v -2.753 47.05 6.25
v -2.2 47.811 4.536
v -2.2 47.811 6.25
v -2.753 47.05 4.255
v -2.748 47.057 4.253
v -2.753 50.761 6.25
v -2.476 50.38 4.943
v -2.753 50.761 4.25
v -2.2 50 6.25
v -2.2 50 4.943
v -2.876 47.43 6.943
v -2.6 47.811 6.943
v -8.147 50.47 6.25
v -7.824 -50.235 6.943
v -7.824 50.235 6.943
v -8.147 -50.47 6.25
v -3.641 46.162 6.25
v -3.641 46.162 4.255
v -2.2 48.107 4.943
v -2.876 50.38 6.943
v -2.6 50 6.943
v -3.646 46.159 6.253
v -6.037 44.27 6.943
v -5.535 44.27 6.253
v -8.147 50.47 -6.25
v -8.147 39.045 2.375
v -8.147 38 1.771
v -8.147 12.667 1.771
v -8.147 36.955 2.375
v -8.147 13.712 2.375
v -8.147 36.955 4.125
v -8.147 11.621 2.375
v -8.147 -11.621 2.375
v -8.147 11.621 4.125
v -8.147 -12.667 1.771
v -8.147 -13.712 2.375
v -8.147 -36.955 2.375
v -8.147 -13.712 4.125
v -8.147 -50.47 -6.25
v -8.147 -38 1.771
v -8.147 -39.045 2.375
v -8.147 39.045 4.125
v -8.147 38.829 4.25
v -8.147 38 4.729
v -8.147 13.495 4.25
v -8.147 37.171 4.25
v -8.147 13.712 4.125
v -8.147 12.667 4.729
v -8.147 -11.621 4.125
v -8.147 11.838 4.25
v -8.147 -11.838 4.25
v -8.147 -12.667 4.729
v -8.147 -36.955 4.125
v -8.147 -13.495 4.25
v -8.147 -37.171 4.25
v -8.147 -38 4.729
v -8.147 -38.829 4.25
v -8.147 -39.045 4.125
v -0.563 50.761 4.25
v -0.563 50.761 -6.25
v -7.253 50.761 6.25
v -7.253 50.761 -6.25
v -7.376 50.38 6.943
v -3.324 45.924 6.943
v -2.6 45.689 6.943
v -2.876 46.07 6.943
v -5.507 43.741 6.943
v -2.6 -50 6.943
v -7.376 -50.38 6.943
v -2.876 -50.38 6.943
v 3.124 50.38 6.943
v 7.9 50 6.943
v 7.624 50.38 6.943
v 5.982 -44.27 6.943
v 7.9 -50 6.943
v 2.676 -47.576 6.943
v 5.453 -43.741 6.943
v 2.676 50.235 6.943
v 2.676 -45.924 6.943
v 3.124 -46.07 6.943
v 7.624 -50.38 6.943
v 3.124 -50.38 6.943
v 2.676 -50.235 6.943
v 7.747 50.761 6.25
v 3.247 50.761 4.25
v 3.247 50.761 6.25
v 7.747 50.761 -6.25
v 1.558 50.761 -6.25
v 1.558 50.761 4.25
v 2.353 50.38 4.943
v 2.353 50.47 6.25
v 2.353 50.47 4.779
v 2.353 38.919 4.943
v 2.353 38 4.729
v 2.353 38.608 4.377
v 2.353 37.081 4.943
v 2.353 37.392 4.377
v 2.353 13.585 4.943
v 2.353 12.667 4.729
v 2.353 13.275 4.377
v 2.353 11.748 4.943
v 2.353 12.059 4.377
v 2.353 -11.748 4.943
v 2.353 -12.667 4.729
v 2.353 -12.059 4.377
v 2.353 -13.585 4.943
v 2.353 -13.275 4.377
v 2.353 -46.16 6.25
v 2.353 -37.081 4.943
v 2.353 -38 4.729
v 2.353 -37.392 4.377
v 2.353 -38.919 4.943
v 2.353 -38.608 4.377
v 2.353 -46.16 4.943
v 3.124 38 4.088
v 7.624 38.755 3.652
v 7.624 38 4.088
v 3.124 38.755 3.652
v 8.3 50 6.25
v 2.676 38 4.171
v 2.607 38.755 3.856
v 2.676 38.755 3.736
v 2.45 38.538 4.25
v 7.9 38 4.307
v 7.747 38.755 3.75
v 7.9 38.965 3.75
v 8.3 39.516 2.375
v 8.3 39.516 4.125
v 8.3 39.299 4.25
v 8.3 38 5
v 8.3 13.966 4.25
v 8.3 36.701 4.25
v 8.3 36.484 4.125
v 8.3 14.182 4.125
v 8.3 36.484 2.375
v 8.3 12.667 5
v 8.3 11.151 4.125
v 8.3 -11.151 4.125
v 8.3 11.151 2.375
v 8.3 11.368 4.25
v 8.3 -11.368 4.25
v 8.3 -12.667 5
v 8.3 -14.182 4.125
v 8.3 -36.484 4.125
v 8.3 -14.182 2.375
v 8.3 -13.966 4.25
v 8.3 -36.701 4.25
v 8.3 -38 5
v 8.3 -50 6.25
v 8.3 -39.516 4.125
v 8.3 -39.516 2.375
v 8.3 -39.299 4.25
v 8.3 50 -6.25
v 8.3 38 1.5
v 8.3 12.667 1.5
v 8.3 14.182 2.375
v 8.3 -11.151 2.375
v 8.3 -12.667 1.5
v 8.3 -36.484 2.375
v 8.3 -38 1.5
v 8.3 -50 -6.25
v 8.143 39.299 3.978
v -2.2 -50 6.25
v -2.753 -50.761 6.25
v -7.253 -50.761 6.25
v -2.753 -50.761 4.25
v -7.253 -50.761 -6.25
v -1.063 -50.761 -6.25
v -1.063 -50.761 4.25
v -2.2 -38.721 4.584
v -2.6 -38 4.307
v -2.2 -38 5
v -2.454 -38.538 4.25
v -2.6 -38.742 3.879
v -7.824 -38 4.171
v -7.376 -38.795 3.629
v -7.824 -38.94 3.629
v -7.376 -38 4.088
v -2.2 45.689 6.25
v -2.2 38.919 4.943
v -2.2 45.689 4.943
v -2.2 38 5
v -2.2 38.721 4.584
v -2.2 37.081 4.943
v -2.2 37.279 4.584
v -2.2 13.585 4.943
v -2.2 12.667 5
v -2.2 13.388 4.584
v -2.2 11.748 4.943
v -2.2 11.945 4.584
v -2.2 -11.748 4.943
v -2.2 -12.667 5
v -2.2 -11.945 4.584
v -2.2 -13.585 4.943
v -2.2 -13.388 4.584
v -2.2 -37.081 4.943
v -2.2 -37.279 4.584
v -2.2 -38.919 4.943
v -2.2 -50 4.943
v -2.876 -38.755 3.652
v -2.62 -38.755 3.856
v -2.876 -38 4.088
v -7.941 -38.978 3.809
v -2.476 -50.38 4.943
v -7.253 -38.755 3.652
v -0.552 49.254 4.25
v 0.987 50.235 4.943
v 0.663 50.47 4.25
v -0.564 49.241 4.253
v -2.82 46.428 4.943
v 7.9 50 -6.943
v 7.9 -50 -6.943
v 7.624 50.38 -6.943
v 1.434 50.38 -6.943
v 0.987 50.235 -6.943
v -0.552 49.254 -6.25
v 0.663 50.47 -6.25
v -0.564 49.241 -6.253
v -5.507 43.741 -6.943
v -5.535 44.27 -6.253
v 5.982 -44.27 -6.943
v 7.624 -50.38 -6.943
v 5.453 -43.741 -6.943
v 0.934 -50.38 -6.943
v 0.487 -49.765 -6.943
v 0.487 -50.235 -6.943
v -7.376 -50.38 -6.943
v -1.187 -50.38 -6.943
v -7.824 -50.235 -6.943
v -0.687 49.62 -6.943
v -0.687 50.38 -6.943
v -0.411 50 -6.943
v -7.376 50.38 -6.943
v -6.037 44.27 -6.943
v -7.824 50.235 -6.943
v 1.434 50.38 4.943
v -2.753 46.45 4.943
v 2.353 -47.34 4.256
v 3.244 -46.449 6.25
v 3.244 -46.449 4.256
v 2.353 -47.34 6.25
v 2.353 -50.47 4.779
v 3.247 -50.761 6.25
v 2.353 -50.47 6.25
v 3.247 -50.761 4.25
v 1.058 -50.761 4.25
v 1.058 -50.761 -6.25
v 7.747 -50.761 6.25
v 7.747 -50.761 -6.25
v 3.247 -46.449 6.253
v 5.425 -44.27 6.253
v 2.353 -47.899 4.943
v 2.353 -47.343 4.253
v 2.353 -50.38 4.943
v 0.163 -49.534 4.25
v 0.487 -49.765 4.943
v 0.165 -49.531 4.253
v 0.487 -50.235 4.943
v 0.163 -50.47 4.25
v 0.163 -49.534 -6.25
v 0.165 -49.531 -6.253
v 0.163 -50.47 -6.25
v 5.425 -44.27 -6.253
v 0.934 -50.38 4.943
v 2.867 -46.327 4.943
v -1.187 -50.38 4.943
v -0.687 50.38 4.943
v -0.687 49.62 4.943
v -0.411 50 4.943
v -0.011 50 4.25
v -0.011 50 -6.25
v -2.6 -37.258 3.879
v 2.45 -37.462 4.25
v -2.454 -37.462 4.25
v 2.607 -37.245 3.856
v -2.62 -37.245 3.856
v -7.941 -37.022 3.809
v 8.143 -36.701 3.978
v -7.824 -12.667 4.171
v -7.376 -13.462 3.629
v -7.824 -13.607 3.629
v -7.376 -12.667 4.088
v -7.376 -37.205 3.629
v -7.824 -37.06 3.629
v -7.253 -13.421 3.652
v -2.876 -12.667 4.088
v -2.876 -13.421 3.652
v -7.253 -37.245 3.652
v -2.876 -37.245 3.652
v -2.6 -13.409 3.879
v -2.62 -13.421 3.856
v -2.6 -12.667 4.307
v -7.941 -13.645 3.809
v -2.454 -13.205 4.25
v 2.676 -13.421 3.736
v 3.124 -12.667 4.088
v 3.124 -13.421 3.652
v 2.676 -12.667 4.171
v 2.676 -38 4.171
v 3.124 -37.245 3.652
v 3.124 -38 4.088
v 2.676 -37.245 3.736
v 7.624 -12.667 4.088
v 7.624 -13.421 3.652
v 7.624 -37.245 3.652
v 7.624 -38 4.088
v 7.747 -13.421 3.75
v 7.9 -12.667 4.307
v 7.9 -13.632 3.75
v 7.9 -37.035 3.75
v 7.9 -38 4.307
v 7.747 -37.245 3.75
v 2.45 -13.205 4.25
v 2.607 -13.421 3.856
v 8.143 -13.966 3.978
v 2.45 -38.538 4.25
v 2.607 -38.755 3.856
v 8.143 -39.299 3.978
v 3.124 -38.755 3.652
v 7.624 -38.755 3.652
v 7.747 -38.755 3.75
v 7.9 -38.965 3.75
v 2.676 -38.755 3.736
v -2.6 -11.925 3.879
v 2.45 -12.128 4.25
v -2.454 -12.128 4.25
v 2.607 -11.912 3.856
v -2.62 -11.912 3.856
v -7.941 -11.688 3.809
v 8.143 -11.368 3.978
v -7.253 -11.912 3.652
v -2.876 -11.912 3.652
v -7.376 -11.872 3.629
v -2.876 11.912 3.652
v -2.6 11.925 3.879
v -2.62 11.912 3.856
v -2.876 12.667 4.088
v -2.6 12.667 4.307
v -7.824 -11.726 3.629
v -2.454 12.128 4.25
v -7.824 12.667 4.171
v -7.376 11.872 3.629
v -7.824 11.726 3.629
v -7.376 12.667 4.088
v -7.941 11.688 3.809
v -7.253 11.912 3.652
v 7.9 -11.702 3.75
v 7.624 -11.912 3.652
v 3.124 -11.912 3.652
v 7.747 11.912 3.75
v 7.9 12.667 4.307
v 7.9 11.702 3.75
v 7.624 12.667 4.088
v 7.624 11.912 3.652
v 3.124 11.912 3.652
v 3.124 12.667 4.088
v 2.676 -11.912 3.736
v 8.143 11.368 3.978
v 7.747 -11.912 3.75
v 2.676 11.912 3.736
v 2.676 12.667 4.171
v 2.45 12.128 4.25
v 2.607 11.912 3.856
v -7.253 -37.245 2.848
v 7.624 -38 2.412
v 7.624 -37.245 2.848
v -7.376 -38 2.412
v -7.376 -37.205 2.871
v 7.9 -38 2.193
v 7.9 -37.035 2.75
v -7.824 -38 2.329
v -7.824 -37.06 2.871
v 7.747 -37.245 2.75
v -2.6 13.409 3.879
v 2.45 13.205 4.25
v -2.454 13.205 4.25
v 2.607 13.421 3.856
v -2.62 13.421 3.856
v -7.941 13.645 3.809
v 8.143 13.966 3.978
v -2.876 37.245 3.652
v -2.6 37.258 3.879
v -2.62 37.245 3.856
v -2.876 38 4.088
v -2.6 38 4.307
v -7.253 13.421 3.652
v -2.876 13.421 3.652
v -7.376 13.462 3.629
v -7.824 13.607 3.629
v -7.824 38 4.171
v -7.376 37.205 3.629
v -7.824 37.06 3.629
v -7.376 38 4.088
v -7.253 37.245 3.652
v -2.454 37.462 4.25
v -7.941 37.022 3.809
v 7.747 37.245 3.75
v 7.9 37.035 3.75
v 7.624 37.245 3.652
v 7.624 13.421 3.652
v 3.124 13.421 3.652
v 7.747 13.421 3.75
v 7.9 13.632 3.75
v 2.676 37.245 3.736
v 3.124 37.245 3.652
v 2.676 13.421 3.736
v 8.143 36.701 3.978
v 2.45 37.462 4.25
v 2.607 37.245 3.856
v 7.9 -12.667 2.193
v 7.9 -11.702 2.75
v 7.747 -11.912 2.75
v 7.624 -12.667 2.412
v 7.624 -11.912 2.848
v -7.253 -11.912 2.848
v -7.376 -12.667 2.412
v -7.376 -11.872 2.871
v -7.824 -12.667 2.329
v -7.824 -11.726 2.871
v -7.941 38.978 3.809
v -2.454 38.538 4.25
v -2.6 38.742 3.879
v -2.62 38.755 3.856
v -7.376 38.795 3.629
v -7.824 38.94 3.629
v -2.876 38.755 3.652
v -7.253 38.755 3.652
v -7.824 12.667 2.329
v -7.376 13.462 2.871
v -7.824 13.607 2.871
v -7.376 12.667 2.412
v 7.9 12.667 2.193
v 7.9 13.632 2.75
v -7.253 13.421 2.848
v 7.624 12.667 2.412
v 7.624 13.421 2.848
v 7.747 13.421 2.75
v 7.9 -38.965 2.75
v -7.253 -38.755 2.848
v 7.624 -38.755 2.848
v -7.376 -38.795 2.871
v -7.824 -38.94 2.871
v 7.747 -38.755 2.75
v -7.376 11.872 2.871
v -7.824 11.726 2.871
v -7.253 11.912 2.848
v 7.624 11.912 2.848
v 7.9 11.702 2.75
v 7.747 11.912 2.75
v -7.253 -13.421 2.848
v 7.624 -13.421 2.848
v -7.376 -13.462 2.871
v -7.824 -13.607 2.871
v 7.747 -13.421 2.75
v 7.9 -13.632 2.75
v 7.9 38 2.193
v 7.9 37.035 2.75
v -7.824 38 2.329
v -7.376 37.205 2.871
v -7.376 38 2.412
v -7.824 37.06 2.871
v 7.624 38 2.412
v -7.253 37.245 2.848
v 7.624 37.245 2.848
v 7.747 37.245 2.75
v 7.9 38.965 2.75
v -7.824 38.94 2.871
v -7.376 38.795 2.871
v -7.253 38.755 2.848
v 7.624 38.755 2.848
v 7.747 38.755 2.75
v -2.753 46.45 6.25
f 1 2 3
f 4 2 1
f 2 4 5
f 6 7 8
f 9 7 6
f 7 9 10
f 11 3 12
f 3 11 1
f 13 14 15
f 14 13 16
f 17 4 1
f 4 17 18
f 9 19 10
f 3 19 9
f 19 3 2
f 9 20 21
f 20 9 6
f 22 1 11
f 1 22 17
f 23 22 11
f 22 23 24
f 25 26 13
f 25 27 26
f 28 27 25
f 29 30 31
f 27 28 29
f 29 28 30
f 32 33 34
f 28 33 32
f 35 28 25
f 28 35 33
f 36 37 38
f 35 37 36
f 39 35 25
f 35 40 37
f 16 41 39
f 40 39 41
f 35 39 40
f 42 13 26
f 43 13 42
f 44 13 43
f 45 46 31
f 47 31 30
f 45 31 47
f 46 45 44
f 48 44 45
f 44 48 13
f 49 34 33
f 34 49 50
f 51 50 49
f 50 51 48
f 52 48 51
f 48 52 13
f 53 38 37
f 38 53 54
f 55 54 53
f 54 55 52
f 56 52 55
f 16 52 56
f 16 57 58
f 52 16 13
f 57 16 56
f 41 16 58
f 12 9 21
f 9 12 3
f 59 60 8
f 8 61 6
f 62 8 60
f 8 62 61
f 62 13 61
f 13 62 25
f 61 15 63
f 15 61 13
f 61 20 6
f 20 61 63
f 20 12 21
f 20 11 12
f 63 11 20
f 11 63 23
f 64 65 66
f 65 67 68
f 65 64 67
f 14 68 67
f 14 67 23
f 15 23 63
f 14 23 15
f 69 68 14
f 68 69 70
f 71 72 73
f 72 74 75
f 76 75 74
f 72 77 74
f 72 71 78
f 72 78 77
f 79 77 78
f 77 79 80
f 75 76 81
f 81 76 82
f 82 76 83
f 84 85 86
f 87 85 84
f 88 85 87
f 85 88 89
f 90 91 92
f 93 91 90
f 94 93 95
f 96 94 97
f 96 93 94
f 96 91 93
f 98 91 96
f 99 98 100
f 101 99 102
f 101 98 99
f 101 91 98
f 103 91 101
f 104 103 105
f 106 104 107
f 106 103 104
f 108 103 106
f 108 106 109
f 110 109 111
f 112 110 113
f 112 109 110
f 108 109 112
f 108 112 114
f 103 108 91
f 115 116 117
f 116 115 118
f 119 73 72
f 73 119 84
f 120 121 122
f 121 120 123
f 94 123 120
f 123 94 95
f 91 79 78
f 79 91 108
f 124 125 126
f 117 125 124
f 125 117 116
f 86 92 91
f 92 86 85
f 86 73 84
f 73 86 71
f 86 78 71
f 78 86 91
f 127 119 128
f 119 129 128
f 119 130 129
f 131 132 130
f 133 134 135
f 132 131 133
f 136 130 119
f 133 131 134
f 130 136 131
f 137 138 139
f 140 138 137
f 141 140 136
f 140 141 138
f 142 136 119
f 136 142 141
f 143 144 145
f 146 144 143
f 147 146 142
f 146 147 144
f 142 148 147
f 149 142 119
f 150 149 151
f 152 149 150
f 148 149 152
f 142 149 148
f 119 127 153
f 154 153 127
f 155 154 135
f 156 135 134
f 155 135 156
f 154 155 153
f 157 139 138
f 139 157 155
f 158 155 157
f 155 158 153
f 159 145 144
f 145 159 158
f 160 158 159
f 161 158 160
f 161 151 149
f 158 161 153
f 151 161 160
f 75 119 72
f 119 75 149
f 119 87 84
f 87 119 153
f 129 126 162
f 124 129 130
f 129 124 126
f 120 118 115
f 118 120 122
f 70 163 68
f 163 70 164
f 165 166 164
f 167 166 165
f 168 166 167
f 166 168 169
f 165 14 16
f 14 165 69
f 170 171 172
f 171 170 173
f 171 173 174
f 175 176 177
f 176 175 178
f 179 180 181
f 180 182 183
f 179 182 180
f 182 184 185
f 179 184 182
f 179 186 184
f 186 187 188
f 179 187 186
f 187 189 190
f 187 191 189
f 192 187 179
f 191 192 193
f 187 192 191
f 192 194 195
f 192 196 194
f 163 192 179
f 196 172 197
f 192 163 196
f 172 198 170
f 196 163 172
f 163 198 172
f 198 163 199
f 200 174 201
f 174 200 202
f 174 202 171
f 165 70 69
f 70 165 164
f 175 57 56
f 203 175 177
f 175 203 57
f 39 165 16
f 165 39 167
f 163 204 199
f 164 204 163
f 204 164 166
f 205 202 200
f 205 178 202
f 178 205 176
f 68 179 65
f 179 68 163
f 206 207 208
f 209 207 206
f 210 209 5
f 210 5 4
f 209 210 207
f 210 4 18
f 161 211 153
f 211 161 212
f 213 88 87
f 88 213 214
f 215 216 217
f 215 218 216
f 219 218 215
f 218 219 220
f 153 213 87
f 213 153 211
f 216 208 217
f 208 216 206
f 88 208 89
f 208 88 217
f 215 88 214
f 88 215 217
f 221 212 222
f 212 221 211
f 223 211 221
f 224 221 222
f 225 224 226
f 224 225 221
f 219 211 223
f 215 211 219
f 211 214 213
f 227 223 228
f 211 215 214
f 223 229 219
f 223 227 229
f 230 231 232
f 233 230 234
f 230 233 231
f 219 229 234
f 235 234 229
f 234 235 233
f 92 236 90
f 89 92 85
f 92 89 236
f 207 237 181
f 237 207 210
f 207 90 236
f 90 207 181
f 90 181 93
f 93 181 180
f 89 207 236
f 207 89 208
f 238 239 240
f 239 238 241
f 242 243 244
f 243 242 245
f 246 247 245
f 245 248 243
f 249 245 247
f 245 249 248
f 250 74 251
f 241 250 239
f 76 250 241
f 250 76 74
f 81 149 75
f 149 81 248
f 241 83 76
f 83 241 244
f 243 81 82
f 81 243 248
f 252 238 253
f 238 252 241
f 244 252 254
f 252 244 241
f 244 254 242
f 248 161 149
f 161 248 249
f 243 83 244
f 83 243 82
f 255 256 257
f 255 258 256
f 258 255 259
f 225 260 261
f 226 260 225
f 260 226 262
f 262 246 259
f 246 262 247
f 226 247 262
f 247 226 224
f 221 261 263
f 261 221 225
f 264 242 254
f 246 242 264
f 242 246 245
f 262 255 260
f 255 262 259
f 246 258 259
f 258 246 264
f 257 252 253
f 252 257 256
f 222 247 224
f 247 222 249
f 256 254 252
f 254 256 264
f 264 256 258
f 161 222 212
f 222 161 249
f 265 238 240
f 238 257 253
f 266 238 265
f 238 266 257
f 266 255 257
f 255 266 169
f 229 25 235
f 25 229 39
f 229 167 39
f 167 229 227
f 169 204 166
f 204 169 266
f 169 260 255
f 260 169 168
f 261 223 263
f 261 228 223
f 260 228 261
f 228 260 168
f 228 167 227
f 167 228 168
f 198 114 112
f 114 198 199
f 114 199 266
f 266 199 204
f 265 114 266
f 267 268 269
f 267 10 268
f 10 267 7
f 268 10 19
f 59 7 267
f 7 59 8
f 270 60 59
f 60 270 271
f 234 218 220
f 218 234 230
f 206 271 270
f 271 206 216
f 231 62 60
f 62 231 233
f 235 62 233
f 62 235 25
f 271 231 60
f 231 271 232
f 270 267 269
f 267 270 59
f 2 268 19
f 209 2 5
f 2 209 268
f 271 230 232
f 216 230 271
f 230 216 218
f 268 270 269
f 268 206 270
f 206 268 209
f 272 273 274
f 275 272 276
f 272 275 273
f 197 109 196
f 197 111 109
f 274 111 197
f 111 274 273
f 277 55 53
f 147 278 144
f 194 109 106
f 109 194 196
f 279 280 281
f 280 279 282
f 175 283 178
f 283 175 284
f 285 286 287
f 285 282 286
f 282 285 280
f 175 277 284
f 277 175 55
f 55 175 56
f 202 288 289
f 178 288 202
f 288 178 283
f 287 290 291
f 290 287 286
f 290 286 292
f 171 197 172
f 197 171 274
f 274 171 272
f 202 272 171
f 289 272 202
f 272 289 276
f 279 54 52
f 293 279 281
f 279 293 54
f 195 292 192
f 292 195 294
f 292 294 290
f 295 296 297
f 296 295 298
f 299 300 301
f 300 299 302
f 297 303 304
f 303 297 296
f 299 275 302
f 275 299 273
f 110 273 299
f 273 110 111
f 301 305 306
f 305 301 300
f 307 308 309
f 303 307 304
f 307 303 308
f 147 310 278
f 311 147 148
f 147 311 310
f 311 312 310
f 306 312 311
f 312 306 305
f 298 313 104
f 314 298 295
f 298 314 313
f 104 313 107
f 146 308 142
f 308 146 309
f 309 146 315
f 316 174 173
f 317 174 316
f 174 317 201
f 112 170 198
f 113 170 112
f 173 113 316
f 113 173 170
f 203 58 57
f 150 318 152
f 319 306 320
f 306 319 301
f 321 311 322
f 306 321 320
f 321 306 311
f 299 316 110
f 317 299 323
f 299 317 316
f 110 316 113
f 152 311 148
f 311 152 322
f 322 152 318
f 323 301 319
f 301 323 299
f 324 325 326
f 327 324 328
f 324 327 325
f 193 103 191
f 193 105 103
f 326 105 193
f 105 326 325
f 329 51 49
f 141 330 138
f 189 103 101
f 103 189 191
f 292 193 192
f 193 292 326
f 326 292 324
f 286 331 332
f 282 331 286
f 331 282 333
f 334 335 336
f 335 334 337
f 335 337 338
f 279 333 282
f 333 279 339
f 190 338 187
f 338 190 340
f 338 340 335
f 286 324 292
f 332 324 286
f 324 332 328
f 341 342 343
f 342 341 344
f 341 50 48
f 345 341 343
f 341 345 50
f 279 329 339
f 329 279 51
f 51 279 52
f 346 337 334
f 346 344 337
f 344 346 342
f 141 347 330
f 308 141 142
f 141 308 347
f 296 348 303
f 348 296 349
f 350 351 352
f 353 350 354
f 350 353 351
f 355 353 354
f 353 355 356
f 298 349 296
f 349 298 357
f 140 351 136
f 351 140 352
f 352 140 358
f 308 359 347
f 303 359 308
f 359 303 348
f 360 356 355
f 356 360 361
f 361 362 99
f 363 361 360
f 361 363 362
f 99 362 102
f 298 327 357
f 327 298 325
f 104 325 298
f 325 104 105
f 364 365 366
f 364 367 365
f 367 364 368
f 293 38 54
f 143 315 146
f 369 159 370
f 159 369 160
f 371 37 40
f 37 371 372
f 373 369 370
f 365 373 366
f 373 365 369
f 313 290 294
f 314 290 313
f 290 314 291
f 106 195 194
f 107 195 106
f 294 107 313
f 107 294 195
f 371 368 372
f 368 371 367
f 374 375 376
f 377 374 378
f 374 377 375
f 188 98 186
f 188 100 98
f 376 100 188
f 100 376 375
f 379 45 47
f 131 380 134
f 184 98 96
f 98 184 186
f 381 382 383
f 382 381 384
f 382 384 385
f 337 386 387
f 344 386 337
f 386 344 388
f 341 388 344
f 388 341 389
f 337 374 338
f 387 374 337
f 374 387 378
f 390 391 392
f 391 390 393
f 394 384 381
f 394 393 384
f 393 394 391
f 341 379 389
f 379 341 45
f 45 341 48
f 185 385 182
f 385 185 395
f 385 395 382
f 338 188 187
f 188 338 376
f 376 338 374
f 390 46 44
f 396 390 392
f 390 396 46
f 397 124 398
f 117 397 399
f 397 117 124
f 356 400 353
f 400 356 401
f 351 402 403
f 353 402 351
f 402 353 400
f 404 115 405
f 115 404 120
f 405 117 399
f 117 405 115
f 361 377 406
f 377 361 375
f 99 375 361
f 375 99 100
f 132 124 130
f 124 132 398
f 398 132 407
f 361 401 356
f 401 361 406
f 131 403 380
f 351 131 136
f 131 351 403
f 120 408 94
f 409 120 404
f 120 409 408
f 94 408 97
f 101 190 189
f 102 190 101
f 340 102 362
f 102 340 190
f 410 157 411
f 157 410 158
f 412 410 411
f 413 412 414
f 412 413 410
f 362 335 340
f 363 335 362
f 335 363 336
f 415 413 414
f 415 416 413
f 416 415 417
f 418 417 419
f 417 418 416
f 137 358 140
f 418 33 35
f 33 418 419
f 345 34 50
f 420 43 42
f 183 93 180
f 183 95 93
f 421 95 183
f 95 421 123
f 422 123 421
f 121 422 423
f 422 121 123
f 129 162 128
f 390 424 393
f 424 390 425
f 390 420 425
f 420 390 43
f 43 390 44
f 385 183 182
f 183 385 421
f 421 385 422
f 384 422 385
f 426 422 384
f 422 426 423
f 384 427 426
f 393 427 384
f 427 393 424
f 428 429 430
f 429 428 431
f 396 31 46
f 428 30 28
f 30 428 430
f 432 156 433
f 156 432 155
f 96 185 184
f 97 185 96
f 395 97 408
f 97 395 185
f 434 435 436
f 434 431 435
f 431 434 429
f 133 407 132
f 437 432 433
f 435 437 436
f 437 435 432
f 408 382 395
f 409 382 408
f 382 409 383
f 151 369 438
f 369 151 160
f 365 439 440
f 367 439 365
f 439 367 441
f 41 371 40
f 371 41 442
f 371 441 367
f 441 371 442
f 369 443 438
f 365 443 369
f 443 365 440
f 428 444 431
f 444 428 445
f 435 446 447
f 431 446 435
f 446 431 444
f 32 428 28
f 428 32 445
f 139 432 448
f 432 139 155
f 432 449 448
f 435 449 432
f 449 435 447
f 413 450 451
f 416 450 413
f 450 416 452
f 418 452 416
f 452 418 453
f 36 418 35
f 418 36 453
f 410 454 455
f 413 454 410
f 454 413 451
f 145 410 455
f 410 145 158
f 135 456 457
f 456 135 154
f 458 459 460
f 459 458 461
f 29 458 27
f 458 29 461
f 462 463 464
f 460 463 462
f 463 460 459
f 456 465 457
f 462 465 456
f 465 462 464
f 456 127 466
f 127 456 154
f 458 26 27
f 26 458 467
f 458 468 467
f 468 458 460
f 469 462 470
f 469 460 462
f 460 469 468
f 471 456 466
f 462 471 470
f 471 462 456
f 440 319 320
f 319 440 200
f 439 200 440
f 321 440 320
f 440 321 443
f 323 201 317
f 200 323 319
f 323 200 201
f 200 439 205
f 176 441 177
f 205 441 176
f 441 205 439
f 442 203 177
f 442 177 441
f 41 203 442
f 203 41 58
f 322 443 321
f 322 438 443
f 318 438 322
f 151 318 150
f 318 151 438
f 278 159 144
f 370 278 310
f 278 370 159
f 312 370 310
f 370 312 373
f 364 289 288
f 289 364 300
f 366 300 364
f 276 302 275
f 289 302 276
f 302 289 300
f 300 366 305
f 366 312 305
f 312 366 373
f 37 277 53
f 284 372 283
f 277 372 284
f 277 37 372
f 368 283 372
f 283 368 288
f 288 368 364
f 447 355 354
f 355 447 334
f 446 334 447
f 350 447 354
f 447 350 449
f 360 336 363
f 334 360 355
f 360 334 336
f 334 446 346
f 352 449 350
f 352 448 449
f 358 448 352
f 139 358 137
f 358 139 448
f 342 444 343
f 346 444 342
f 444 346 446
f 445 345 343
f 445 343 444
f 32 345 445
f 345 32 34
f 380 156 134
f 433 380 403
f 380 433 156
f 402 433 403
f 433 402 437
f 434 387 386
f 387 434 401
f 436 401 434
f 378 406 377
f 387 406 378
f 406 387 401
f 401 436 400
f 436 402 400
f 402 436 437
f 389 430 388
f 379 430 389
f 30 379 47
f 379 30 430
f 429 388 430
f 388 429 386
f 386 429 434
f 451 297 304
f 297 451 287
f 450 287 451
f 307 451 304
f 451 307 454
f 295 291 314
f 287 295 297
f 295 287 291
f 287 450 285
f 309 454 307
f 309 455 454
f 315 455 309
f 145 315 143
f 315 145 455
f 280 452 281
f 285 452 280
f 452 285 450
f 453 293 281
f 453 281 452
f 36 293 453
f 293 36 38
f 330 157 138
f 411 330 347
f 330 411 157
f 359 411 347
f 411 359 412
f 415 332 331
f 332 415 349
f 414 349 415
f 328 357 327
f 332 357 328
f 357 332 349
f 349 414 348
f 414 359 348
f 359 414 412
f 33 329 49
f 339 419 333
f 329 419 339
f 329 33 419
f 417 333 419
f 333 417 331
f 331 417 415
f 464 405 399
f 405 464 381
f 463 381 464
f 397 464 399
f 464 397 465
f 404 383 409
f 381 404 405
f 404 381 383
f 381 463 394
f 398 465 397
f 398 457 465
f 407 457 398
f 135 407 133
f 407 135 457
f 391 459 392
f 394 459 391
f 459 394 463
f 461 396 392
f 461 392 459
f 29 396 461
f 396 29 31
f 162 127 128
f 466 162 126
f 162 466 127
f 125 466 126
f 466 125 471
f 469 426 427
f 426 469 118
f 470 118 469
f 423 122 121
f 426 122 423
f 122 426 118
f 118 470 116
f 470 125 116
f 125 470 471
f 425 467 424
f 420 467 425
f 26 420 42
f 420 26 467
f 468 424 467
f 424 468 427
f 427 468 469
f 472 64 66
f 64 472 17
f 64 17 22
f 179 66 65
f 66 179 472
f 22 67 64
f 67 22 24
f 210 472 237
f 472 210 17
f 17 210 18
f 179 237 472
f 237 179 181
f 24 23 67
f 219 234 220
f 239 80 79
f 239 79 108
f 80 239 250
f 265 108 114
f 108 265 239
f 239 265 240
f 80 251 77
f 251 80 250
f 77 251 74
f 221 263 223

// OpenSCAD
// Parameters
rail_W = 15.0; //[7.5:30.0:0.5]
rail_H = 12.5; //[6.25:25.0:0.5]
rail_L = 100.0; //[50.0:200.0:1]
overlap = 1.0; //[0.5:2.0:0.1]
hole_d = 3.5; //[2.0:6.0:0.1]
hole_count = 4; //[2:8:1]
hole_edge_margin = 12.0; //[6.0:25.0:0.5]
hole_z_from_top = 3.0; //[1.5:6.0:0.25]
chamfer_len = 1.5; //[0.5:4.0:0.25]
fillet_r = 0.8; //[0.3:2.0:0.1]
groove_W = 6.0; //[3.0:10.0:0.25]
groove_D = 1.5; //[0.5:4.0:0.25]

// Rail Body
module rail_body() {
  color("Silver")
  cube([rail_W, rail_L, rail_H], center=true);
}

// Groove Cut
module groove_cut() {
  translate([0, 0, rail_H/2 - groove_D/2])
  cube([groove_W, rail_L + 2*overlap, groove_D + overlap], center=true);
}

// Hole Cutter Prototype
module hole_cutter_proto() {
  rotate([0, 90, 0])
  cylinder(h=rail_W + 2*overlap, r=hole_d/2, center=true);
}

// End Chamfer
module end_chamfer() {
  cube([rail_W + 2*overlap, chamfer_len, rail_H + 2*overlap], center=true);
}

// Fillet Sphere
module fillet_sphere() {
  sphere(r=fillet_r, center=true);
}

// Mounting Holes
module mounting_holes() {
  union() {
    for (i = [0:hole_count-1]) {
      translate([0, -rail_L/2 + hole_edge_margin + i*(rail_L - 2*hole_edge_margin)/(hole_count - 1), rail_H/2 - hole_z_from_top])
      hole_cutter_proto();
    }
  }
}

// Rail with Groove and Holes
module rail_with_groove_and_holes() {
  difference() {
    rail_body();
    groove_cut();
    mounting_holes();
  }
}

// Rail with Chamfers
module rail_with_chamfers() {
  difference() {
    rail_with_groove_and_holes();
    translate([0, rail_L/2 - chamfer_len/2 + overlap/2, 0])
    rotate([0, 0, 45]) end_chamfer();
    translate([0, -rail_L/2 + chamfer_len/2 - overlap/2, 0])
    rotate([0, 0, 45]) end_chamfer();
  }
}

// Rail with Edge Fillets
module rail_with_edge_fillets() {
  minkowski() {
    rail_with_chamfers();
    fillet_sphere();
  }
}

// Complete Model
module complete_model() {
  rail_with_edge_fillets();
}

// Final Output
complete_model();
